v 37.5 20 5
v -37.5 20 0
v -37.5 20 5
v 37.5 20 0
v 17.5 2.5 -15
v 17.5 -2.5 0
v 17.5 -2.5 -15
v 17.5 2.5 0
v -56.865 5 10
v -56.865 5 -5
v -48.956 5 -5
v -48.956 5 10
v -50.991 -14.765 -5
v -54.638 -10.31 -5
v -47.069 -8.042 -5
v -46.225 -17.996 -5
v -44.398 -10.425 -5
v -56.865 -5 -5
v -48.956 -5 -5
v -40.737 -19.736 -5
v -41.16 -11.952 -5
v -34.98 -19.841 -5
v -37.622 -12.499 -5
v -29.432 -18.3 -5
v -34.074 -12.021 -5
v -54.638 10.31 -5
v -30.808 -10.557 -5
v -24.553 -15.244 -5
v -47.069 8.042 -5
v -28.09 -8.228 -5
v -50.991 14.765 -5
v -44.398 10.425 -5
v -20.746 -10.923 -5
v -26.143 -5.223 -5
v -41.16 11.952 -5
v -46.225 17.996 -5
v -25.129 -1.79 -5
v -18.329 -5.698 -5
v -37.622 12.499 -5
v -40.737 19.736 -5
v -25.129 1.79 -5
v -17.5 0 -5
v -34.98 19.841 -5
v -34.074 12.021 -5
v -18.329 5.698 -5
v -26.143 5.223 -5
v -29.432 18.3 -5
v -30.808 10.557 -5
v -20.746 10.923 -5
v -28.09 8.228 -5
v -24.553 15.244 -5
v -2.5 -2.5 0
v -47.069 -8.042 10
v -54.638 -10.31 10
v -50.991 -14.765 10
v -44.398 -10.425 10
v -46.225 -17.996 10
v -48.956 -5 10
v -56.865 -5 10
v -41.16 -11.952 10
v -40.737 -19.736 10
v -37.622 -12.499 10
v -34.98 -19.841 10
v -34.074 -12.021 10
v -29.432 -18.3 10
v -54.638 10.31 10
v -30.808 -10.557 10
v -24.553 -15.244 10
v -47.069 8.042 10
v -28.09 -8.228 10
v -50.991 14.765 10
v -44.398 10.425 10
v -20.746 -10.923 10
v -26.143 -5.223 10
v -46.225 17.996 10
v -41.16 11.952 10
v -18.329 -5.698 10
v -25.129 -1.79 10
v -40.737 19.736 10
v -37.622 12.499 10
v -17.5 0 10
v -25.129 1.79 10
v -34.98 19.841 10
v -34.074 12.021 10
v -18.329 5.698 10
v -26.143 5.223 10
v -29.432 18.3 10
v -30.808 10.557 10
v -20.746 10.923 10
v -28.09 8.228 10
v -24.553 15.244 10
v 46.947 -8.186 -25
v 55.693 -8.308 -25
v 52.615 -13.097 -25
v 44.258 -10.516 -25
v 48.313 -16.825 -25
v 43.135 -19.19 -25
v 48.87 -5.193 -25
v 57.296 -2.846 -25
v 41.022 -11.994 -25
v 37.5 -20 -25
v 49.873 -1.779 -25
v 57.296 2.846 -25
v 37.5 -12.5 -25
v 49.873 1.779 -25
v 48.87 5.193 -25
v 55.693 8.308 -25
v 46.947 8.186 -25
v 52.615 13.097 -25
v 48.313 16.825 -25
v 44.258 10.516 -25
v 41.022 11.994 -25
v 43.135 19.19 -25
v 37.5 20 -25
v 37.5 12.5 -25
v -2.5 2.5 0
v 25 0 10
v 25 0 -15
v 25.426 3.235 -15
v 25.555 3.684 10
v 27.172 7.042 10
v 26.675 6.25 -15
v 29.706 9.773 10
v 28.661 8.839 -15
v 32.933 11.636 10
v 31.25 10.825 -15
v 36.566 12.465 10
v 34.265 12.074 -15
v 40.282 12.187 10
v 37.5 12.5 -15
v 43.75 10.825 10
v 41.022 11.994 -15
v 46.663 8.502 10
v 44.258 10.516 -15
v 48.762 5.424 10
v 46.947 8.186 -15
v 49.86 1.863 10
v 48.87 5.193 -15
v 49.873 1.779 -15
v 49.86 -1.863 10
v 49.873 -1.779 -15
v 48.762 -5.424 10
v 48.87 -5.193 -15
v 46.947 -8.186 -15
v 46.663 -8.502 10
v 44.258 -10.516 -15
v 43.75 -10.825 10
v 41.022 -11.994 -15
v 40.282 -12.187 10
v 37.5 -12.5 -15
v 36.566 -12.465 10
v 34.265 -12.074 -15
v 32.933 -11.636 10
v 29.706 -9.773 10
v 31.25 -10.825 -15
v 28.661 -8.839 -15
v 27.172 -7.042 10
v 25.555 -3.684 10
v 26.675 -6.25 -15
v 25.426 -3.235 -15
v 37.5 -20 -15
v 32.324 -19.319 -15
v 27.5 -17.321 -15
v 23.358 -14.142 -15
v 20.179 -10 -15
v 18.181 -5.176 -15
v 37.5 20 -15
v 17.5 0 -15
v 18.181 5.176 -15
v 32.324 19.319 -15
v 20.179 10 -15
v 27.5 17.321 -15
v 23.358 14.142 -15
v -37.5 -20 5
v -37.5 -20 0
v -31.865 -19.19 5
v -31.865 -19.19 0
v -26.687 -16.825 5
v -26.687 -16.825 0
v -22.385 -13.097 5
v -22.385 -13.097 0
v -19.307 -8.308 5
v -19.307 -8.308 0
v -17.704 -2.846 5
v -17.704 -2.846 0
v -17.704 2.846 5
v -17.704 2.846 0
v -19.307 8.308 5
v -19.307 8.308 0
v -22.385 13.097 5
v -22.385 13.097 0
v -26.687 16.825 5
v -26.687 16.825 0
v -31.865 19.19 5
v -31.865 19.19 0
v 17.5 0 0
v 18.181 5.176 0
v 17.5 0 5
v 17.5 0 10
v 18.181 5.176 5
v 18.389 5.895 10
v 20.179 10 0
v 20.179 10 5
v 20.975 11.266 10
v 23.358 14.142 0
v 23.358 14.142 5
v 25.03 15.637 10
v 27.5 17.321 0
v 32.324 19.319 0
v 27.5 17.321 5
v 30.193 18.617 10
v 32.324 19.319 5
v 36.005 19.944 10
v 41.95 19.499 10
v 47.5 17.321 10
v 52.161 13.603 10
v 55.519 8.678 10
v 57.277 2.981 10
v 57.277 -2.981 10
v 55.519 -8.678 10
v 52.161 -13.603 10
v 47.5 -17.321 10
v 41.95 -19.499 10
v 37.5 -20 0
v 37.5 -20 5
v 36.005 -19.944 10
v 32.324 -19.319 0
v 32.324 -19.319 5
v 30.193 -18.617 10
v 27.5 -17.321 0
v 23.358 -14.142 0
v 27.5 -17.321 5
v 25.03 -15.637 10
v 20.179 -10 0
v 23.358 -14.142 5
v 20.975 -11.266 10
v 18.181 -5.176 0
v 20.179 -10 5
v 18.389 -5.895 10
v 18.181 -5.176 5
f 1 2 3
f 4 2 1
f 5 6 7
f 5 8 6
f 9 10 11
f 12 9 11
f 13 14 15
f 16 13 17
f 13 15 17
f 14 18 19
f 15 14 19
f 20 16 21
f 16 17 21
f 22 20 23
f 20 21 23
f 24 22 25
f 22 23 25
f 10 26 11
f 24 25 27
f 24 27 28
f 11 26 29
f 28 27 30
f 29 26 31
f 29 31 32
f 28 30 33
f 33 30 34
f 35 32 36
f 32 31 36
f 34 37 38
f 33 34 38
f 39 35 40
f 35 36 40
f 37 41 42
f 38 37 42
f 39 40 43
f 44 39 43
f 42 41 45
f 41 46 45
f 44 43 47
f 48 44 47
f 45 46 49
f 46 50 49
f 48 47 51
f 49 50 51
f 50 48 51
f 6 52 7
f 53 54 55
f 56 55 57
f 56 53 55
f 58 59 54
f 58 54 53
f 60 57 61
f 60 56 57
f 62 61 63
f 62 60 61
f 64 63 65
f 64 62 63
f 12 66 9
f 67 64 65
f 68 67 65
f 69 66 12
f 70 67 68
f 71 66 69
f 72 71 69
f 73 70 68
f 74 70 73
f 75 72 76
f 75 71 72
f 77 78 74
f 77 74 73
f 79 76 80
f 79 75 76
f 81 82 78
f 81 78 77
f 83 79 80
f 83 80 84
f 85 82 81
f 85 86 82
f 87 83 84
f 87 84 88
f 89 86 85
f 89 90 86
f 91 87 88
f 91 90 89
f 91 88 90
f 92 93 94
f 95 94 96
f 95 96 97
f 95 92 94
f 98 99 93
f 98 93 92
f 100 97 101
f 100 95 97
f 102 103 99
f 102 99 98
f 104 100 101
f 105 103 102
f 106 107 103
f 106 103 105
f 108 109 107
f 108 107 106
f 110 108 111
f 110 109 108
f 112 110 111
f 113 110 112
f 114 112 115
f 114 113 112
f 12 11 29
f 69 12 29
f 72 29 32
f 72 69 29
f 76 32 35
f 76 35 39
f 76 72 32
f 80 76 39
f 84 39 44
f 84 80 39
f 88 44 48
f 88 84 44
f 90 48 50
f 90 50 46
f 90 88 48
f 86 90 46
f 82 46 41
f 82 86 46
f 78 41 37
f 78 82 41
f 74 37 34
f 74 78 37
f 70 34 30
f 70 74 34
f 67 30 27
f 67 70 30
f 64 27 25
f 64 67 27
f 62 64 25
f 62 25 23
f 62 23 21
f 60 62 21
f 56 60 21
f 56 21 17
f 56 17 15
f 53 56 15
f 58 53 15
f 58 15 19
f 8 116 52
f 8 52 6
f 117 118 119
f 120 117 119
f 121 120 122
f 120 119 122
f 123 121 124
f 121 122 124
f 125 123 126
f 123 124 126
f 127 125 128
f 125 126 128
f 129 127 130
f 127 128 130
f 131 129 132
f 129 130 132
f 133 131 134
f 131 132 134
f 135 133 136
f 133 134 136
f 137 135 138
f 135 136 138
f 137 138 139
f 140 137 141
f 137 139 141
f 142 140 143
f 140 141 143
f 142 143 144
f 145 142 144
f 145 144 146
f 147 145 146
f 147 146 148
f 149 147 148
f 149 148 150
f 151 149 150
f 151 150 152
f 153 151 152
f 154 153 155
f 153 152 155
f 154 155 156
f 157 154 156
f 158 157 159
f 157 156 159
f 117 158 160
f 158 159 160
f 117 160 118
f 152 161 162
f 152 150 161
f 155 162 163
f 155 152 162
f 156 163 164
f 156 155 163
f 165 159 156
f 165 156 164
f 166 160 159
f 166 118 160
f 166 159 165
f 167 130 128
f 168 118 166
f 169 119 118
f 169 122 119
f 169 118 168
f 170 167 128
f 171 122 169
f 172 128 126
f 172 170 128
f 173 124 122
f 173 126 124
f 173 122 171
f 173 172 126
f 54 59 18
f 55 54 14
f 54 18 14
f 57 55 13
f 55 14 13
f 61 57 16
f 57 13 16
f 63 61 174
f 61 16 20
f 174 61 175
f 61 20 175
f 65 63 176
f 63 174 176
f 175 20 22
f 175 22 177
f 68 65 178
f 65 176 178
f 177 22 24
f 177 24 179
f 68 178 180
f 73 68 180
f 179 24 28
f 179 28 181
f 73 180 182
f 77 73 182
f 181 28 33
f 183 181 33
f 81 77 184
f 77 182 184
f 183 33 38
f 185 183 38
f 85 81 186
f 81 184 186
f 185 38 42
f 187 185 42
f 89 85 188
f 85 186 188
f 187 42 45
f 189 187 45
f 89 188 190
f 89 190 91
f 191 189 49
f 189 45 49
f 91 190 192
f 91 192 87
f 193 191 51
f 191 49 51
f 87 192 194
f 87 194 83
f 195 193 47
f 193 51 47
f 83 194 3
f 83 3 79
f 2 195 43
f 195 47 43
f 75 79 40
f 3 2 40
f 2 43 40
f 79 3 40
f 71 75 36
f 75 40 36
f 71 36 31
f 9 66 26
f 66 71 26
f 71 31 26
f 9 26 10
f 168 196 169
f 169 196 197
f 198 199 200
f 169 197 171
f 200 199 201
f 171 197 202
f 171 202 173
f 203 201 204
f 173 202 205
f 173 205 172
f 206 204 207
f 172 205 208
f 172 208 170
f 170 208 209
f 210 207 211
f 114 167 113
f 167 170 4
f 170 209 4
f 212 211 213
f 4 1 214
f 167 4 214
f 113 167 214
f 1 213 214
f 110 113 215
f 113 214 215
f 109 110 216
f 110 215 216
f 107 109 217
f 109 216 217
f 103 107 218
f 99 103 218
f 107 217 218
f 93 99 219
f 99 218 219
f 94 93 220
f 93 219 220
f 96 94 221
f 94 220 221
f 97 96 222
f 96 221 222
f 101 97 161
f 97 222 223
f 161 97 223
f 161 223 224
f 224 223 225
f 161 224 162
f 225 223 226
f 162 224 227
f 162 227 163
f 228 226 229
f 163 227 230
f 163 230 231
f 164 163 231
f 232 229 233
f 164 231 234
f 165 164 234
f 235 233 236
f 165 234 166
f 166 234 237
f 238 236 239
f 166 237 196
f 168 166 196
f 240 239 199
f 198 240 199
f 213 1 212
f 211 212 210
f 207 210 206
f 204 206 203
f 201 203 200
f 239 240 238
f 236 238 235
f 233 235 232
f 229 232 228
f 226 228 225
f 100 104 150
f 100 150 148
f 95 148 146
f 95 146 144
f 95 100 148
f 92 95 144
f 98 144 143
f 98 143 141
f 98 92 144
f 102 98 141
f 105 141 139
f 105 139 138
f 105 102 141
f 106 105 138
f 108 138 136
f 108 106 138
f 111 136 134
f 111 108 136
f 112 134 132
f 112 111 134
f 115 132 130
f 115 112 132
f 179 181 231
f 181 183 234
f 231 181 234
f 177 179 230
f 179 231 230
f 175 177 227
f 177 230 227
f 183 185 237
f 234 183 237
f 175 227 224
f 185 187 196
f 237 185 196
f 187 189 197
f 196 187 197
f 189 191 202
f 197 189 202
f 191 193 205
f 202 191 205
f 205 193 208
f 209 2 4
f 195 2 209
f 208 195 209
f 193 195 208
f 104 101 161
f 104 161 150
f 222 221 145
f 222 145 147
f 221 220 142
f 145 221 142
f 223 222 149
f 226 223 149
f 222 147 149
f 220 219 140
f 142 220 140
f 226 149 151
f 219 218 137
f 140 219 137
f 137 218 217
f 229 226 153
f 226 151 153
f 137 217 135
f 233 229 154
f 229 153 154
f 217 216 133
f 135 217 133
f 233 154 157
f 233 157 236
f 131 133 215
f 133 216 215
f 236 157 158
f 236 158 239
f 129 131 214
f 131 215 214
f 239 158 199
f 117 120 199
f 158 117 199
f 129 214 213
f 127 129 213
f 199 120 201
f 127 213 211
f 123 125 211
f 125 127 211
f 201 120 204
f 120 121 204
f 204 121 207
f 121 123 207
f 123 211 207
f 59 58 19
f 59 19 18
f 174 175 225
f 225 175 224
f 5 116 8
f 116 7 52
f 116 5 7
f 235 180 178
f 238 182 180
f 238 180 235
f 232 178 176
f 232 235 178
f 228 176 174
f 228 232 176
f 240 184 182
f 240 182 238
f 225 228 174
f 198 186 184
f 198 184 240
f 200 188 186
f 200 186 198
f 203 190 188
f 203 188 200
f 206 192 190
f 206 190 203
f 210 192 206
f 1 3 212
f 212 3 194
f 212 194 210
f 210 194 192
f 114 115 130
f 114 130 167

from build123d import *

# Parameters (mm, degrees)
SKETCH1_W                = 75
SKETCH1_H                = 40
BOSS_EXTRUDE1_DEPTH      = 5
BOSS_EXTRUDE2_DEPTH      = 5
BOSS_EXTRUDE2_DEPTH_BACK = 10
SKETCH4_R                = 20
CUT_EXTRUDE4_DEPTH       = 15
BOSS_EXTRUDE3_DEPTH      = 15
BOSS_EXTRUDE3_DEPTH_BACK = 10
SKETCH8_R                = 20
SKETCH9_R                = 12.5
CUT_EXTRUDE5_DEPTH       = 25
BOSS_EXTRUDE4_START      = 10
BOSS_EXTRUDE4_DEPTH      = 10
BOSS_EXTRUDE5_DEPTH      = 2.5


with BuildPart() as part:
    # Sketch1 → Boss-Extrude1 (new body)
    with BuildSketch(Plane.XY):
        Rectangle(SKETCH1_W, SKETCH1_H)
    extrude(amount=BOSS_EXTRUDE1_DEPTH)

    # Sketch4 → Boss-Extrude2 (add, two sides: drawn at the far end of the back side and taken through both)
    with BuildSketch(Plane.XY.offset(5).offset(-BOSS_EXTRUDE2_DEPTH_BACK)):
        with Locations((-37.5, 0)):
            Circle(SKETCH4_R)
    extrude(amount=BOSS_EXTRUDE2_DEPTH + BOSS_EXTRUDE2_DEPTH_BACK)

    # Sketch6 → Cut-Extrude4 (cut)
    with BuildSketch(Plane.XY.offset(10)):
        with BuildLine():
            Line((-57.5, -5), (-57.5, 5))
            Line((-57.5, 5), (-48.956439237, 5))
            ThreePointArc((-48.956439237, 5), (-25, 0), (-48.956439237, -5))
            Line((-48.956439237, -5), (-57.5, -5))
        make_face()
    extrude(amount=-CUT_EXTRUDE4_DEPTH, mode=Mode.SUBTRACT)

    # Sketch8 → Boss-Extrude3 (add, two sides: drawn at the far end of the back side and taken through both)
    with BuildSketch(Plane(origin=(0, 0, 0), x_dir=(-1, 0, 0), z_dir=(0, 0, -1)).offset(-BOSS_EXTRUDE3_DEPTH_BACK)):
        with Locations((-37.5, 0)):
            Circle(SKETCH8_R)
    extrude(amount=BOSS_EXTRUDE3_DEPTH + BOSS_EXTRUDE3_DEPTH_BACK)

    # Sketch9 → Cut-Extrude5 (cut)
    with BuildSketch(Plane(origin=(0, 0, -15), x_dir=(-1, 0, 0), z_dir=(0, 0, -1))):
        with Locations((-37.5, 0)):
            Circle(SKETCH9_R)
    extrude(amount=-CUT_EXTRUDE5_DEPTH, mode=Mode.SUBTRACT)

    # Sketch10 → Boss-Extrude4 (add)
    with BuildSketch(Plane(origin=(0, 0, -15), x_dir=(-1, 0, 0), z_dir=(0, 0, -1)).offset(BOSS_EXTRUDE4_START)):
        with BuildLine():
            Line((-37.5, -20), (-37.5, -12.5))
            ThreePointArc((-37.5, -12.5), (-50, 0), (-37.5, 12.5))
            Line((-37.5, 12.5), (-37.5, 20))
            ThreePointArc((-37.5, 20), (-57.5, 0), (-37.5, -20))
        make_face()
    extrude(amount=-BOSS_EXTRUDE4_DEPTH)


with BuildPart() as body_2:
    # Sketch11 → Boss-Extrude5 (new, symmetric)
    with BuildSketch(Plane(origin=(0, 0, 0), x_dir=(1, 0, 0), z_dir=(0, 1, 0))):
        Polygon((17.5, 15), (-2.5, 0), (17.5, 0), align=None)
    extrude(amount=BOSS_EXTRUDE5_DEPTH, both=True)


solid = Compound([part.part, body_2.part])
